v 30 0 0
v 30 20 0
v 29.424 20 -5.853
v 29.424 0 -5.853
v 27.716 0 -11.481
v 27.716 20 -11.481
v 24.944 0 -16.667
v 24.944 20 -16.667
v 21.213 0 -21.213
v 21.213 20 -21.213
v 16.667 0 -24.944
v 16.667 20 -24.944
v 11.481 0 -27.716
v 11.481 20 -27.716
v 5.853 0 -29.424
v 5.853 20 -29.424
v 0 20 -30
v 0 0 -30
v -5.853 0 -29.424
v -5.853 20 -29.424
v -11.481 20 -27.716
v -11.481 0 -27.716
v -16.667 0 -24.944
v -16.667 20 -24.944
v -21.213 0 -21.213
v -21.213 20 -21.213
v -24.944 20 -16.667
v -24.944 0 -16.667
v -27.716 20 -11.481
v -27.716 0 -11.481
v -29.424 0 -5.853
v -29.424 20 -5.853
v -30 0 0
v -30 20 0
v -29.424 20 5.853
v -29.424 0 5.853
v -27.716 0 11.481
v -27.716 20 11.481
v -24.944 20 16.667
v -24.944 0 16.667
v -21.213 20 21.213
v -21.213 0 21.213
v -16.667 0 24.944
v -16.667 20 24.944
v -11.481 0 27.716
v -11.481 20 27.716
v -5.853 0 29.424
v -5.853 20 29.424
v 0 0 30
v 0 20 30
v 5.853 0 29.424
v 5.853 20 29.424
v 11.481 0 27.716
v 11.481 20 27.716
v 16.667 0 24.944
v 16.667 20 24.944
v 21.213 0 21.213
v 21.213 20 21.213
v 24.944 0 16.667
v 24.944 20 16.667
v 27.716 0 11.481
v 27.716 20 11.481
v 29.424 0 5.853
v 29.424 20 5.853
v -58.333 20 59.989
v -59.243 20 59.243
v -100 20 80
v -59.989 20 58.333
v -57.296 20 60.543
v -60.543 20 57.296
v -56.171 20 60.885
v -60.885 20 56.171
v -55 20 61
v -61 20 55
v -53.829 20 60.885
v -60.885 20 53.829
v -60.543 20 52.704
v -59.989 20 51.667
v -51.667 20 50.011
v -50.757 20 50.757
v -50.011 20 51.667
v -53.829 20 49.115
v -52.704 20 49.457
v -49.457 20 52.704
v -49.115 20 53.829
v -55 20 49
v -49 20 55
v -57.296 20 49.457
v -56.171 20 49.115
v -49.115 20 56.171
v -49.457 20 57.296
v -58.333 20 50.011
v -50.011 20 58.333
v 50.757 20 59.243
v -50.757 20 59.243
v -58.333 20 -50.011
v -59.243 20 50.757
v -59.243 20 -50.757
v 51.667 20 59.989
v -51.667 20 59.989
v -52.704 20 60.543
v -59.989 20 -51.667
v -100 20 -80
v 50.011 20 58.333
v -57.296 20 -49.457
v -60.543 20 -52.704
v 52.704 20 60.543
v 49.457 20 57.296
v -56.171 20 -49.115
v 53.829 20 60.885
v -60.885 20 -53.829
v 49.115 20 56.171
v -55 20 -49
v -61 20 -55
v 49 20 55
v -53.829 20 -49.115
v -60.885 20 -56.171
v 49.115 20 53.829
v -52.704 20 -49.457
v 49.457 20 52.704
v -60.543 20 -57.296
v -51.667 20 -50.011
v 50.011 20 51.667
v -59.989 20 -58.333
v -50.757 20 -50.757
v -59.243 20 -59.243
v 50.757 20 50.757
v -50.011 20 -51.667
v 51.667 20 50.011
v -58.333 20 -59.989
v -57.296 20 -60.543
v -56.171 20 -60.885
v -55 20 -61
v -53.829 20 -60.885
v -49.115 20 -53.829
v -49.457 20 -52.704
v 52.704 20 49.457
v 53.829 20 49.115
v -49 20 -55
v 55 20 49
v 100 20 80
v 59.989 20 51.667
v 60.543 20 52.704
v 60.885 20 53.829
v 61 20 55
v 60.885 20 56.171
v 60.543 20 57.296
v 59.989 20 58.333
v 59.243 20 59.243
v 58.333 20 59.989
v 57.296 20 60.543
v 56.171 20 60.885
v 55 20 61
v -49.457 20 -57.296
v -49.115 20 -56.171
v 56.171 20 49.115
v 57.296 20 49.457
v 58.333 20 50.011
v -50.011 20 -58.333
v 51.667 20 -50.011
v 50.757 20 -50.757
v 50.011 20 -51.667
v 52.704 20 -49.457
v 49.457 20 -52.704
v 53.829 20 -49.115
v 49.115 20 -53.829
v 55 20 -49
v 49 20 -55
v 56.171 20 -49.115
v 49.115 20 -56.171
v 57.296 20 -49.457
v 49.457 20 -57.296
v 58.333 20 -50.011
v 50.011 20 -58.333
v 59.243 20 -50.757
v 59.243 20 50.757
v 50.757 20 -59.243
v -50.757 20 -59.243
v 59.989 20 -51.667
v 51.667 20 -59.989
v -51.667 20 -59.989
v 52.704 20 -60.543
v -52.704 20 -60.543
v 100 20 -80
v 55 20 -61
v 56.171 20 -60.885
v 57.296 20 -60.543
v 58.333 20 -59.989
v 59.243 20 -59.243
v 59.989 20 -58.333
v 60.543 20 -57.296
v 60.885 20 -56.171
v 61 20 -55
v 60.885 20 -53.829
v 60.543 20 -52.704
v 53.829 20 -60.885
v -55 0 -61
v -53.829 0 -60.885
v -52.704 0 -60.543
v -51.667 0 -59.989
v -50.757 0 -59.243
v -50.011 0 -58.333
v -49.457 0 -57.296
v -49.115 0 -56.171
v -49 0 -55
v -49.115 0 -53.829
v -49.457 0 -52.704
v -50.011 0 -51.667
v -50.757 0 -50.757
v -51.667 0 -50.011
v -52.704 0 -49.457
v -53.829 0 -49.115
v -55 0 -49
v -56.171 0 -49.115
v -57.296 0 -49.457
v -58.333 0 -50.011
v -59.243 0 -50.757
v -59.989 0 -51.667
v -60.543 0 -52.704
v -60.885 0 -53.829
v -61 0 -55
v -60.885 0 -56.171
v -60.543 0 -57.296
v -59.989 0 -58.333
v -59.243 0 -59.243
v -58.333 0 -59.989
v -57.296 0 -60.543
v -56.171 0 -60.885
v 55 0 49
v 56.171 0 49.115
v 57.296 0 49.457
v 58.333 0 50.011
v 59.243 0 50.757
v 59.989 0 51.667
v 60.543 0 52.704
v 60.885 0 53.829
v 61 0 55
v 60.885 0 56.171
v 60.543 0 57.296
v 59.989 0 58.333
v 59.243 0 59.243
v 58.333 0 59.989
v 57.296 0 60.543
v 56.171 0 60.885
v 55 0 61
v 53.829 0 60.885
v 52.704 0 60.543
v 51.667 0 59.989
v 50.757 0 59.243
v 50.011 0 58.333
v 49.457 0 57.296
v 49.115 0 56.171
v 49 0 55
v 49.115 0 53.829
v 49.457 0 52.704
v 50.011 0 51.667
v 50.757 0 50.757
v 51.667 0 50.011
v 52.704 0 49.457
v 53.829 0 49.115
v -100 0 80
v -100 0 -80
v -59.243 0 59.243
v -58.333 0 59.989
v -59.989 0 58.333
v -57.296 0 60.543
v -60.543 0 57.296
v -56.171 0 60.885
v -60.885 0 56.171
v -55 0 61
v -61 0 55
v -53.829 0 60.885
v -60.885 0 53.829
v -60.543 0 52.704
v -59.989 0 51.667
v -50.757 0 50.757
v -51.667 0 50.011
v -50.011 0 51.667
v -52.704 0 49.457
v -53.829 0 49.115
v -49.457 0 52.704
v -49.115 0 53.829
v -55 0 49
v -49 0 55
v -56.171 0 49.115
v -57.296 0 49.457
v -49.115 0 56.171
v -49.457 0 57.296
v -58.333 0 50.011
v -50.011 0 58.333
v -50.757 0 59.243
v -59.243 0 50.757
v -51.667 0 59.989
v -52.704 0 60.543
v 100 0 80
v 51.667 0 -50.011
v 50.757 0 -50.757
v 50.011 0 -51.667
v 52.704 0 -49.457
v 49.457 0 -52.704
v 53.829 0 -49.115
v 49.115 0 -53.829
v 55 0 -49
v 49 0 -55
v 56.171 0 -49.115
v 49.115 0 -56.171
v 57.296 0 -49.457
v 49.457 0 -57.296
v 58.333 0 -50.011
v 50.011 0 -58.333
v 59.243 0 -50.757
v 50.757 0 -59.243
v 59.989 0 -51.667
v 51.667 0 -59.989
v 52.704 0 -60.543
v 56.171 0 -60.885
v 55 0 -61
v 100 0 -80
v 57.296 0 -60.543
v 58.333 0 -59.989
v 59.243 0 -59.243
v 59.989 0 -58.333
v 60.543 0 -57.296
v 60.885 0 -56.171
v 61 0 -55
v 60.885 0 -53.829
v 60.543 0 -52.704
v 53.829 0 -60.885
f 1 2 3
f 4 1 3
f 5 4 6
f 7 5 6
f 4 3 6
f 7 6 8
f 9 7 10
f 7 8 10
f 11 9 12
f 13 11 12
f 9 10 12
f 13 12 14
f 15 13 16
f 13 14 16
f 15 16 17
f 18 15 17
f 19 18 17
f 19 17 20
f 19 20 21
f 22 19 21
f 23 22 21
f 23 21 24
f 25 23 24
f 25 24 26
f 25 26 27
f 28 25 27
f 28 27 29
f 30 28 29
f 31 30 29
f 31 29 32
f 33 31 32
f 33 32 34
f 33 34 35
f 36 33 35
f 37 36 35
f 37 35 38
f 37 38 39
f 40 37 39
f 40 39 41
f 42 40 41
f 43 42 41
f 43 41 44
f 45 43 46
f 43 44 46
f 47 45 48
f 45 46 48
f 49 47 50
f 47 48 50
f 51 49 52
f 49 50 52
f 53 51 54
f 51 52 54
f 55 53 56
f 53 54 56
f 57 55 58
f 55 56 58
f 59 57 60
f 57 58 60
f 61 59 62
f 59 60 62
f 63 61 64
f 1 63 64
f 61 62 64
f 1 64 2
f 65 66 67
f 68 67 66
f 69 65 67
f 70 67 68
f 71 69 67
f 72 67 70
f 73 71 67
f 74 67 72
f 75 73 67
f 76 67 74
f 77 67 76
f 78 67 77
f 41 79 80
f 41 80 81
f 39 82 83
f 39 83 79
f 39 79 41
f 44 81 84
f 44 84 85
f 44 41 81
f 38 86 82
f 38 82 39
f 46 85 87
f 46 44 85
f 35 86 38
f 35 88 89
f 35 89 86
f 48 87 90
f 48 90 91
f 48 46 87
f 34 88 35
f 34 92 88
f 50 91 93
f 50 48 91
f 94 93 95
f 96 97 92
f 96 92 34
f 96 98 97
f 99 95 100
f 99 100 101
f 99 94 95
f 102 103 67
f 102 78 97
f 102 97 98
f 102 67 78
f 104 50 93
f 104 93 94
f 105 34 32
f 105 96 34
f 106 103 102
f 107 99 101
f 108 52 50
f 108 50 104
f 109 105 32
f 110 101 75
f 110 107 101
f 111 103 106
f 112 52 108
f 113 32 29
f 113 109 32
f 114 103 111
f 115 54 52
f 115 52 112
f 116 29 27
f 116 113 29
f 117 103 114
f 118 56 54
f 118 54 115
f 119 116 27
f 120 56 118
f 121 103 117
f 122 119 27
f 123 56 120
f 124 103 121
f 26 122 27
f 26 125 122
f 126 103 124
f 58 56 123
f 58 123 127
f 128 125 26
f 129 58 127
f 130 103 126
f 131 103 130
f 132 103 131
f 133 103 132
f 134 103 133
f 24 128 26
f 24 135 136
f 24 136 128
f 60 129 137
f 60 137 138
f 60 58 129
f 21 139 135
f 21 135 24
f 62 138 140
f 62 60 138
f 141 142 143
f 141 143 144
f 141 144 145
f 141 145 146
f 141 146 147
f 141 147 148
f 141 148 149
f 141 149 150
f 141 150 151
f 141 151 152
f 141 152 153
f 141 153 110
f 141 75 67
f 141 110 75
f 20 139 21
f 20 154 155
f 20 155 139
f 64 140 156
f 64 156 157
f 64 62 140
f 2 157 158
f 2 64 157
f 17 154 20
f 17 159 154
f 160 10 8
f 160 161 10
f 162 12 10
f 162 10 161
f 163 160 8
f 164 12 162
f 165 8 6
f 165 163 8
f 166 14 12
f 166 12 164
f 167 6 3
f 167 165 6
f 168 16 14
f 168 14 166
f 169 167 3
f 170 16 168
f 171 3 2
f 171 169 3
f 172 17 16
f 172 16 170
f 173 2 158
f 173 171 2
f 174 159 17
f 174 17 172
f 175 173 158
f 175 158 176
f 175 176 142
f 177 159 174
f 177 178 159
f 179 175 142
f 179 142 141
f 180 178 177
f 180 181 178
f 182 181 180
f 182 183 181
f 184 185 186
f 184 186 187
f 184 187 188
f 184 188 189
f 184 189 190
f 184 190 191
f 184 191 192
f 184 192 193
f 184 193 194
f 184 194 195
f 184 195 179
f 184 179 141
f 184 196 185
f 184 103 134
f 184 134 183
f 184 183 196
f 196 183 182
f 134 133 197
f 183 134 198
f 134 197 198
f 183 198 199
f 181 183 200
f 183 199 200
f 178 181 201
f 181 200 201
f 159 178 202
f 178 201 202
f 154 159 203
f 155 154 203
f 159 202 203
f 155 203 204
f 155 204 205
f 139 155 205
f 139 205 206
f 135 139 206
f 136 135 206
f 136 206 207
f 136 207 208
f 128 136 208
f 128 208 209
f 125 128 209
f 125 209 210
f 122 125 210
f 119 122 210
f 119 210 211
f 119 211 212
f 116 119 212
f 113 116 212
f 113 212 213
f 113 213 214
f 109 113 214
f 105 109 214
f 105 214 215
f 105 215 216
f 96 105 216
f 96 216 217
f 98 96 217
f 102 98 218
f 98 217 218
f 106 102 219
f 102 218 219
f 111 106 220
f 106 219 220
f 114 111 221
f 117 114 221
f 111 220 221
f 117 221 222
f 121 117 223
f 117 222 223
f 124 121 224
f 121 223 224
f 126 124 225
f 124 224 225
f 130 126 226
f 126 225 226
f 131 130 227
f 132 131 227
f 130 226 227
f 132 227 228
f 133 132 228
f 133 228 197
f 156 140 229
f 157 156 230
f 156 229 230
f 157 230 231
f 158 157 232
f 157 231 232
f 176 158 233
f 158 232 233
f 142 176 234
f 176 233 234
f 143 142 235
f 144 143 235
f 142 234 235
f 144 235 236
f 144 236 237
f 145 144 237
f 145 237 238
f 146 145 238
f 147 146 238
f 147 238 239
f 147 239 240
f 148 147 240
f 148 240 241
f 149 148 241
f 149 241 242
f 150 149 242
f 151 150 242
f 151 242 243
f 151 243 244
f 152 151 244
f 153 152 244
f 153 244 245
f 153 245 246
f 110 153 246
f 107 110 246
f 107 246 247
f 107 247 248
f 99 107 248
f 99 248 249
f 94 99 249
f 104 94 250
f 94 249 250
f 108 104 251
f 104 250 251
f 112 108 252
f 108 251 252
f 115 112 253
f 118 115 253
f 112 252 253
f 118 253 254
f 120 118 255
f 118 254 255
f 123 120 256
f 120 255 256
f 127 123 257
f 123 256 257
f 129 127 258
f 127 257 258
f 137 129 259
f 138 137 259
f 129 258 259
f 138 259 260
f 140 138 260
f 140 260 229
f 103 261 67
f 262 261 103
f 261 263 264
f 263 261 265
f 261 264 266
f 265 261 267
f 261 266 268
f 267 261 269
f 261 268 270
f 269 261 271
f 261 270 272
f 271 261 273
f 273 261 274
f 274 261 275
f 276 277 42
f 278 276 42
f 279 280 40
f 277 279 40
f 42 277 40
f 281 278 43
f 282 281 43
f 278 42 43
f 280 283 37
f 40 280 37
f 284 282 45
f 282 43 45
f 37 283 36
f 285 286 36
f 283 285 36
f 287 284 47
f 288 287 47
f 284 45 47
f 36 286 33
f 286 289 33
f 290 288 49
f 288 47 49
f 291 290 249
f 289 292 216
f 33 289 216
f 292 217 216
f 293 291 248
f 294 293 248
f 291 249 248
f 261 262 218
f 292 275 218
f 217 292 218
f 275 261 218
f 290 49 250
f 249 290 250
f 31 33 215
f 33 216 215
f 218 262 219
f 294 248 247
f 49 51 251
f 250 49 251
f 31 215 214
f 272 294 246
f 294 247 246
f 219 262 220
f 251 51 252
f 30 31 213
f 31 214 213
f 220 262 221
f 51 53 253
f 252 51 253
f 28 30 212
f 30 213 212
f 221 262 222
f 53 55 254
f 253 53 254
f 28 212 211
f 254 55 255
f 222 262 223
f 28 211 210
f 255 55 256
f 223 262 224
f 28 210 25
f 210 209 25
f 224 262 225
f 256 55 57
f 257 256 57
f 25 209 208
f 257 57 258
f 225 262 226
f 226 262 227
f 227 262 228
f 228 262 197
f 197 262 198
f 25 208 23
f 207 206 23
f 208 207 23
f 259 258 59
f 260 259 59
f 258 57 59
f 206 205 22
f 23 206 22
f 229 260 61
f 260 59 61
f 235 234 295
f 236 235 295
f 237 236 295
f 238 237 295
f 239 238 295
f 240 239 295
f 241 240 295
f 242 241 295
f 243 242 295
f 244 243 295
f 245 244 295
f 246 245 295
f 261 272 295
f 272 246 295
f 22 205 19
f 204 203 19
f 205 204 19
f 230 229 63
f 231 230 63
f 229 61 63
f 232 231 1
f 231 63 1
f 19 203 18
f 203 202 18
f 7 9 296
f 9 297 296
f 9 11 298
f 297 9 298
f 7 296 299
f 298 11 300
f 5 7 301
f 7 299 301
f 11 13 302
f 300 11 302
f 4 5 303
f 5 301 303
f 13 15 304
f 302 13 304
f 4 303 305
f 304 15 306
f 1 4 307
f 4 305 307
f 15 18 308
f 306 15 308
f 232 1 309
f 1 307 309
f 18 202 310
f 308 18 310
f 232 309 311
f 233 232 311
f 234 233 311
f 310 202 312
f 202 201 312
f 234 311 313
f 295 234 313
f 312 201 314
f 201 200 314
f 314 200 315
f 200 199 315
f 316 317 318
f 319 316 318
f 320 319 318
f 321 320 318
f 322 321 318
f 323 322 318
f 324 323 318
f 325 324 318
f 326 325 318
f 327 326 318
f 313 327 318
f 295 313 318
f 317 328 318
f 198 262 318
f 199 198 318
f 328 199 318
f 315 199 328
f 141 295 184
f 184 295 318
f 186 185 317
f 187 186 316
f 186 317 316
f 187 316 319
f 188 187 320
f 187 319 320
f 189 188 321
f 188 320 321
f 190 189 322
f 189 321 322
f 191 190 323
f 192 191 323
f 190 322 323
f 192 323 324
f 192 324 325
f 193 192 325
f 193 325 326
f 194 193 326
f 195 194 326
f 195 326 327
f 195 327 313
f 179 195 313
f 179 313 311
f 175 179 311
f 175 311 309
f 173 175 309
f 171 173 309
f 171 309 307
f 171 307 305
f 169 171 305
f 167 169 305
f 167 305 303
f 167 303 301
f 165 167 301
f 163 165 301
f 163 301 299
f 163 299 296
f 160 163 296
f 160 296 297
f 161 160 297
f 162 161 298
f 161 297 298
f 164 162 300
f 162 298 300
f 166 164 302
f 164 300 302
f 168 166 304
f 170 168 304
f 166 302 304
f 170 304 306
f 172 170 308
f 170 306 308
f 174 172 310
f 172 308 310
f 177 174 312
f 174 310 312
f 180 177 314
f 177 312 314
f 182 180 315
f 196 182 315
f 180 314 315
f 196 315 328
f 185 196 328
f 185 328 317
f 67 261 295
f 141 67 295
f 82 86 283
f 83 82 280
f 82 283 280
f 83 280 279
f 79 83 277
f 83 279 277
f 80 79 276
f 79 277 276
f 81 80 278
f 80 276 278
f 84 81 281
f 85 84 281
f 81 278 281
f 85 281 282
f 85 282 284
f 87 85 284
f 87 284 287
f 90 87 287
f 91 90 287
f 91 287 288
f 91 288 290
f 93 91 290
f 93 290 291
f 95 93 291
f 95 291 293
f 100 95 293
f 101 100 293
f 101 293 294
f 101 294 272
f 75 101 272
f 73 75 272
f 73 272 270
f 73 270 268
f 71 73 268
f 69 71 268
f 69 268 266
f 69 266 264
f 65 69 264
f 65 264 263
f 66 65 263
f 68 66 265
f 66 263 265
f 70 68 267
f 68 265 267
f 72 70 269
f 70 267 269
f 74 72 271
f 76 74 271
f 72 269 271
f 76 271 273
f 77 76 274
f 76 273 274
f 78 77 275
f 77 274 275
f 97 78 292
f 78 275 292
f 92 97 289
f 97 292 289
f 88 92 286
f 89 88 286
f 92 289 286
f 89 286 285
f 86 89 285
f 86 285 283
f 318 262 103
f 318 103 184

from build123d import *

# Parameters (mm, degrees)
SKETCH1_W                  = 200
SKETCH1_H                  = 160
BASE_DEPTH                 = 20
SKETCH2_R                  = 30
ACTUATOR_CUT_DEPTH         = 40
F_12_0MM_DOWEL_HOLE1_D     = 12
F_12_0MM_DOWEL_HOLE1_DEPTH = 20


with BuildPart() as part:
    # Sketch1 → base (new body)
    with BuildSketch(Plane(origin=(0, 0, 0), x_dir=(1, 0, 0), z_dir=(0, 1, 0))):
        Rectangle(SKETCH1_W, SKETCH1_H)
    extrude(amount=BASE_DEPTH)

    # Sketch2 → actuator cut (cut)
    with BuildSketch(Plane(origin=(0, 20, 0), x_dir=(1, 0, 0), z_dir=(0, 1, 0))):
        Circle(SKETCH2_R)
    extrude(amount=-ACTUATOR_CUT_DEPTH, mode=Mode.SUBTRACT)

    # Ø12.0mm Dowel Hole1
    with Locations(Plane(origin=(55, 20, -55), x_dir=(0, 0, 1), z_dir=(0, 1, 0))):
        with Locations((0, 0), (0, -110), (110, -110), (110, 0)):
            Hole(F_12_0MM_DOWEL_HOLE1_D / 2, depth=F_12_0MM_DOWEL_HOLE1_DEPTH)


solid = part.part
